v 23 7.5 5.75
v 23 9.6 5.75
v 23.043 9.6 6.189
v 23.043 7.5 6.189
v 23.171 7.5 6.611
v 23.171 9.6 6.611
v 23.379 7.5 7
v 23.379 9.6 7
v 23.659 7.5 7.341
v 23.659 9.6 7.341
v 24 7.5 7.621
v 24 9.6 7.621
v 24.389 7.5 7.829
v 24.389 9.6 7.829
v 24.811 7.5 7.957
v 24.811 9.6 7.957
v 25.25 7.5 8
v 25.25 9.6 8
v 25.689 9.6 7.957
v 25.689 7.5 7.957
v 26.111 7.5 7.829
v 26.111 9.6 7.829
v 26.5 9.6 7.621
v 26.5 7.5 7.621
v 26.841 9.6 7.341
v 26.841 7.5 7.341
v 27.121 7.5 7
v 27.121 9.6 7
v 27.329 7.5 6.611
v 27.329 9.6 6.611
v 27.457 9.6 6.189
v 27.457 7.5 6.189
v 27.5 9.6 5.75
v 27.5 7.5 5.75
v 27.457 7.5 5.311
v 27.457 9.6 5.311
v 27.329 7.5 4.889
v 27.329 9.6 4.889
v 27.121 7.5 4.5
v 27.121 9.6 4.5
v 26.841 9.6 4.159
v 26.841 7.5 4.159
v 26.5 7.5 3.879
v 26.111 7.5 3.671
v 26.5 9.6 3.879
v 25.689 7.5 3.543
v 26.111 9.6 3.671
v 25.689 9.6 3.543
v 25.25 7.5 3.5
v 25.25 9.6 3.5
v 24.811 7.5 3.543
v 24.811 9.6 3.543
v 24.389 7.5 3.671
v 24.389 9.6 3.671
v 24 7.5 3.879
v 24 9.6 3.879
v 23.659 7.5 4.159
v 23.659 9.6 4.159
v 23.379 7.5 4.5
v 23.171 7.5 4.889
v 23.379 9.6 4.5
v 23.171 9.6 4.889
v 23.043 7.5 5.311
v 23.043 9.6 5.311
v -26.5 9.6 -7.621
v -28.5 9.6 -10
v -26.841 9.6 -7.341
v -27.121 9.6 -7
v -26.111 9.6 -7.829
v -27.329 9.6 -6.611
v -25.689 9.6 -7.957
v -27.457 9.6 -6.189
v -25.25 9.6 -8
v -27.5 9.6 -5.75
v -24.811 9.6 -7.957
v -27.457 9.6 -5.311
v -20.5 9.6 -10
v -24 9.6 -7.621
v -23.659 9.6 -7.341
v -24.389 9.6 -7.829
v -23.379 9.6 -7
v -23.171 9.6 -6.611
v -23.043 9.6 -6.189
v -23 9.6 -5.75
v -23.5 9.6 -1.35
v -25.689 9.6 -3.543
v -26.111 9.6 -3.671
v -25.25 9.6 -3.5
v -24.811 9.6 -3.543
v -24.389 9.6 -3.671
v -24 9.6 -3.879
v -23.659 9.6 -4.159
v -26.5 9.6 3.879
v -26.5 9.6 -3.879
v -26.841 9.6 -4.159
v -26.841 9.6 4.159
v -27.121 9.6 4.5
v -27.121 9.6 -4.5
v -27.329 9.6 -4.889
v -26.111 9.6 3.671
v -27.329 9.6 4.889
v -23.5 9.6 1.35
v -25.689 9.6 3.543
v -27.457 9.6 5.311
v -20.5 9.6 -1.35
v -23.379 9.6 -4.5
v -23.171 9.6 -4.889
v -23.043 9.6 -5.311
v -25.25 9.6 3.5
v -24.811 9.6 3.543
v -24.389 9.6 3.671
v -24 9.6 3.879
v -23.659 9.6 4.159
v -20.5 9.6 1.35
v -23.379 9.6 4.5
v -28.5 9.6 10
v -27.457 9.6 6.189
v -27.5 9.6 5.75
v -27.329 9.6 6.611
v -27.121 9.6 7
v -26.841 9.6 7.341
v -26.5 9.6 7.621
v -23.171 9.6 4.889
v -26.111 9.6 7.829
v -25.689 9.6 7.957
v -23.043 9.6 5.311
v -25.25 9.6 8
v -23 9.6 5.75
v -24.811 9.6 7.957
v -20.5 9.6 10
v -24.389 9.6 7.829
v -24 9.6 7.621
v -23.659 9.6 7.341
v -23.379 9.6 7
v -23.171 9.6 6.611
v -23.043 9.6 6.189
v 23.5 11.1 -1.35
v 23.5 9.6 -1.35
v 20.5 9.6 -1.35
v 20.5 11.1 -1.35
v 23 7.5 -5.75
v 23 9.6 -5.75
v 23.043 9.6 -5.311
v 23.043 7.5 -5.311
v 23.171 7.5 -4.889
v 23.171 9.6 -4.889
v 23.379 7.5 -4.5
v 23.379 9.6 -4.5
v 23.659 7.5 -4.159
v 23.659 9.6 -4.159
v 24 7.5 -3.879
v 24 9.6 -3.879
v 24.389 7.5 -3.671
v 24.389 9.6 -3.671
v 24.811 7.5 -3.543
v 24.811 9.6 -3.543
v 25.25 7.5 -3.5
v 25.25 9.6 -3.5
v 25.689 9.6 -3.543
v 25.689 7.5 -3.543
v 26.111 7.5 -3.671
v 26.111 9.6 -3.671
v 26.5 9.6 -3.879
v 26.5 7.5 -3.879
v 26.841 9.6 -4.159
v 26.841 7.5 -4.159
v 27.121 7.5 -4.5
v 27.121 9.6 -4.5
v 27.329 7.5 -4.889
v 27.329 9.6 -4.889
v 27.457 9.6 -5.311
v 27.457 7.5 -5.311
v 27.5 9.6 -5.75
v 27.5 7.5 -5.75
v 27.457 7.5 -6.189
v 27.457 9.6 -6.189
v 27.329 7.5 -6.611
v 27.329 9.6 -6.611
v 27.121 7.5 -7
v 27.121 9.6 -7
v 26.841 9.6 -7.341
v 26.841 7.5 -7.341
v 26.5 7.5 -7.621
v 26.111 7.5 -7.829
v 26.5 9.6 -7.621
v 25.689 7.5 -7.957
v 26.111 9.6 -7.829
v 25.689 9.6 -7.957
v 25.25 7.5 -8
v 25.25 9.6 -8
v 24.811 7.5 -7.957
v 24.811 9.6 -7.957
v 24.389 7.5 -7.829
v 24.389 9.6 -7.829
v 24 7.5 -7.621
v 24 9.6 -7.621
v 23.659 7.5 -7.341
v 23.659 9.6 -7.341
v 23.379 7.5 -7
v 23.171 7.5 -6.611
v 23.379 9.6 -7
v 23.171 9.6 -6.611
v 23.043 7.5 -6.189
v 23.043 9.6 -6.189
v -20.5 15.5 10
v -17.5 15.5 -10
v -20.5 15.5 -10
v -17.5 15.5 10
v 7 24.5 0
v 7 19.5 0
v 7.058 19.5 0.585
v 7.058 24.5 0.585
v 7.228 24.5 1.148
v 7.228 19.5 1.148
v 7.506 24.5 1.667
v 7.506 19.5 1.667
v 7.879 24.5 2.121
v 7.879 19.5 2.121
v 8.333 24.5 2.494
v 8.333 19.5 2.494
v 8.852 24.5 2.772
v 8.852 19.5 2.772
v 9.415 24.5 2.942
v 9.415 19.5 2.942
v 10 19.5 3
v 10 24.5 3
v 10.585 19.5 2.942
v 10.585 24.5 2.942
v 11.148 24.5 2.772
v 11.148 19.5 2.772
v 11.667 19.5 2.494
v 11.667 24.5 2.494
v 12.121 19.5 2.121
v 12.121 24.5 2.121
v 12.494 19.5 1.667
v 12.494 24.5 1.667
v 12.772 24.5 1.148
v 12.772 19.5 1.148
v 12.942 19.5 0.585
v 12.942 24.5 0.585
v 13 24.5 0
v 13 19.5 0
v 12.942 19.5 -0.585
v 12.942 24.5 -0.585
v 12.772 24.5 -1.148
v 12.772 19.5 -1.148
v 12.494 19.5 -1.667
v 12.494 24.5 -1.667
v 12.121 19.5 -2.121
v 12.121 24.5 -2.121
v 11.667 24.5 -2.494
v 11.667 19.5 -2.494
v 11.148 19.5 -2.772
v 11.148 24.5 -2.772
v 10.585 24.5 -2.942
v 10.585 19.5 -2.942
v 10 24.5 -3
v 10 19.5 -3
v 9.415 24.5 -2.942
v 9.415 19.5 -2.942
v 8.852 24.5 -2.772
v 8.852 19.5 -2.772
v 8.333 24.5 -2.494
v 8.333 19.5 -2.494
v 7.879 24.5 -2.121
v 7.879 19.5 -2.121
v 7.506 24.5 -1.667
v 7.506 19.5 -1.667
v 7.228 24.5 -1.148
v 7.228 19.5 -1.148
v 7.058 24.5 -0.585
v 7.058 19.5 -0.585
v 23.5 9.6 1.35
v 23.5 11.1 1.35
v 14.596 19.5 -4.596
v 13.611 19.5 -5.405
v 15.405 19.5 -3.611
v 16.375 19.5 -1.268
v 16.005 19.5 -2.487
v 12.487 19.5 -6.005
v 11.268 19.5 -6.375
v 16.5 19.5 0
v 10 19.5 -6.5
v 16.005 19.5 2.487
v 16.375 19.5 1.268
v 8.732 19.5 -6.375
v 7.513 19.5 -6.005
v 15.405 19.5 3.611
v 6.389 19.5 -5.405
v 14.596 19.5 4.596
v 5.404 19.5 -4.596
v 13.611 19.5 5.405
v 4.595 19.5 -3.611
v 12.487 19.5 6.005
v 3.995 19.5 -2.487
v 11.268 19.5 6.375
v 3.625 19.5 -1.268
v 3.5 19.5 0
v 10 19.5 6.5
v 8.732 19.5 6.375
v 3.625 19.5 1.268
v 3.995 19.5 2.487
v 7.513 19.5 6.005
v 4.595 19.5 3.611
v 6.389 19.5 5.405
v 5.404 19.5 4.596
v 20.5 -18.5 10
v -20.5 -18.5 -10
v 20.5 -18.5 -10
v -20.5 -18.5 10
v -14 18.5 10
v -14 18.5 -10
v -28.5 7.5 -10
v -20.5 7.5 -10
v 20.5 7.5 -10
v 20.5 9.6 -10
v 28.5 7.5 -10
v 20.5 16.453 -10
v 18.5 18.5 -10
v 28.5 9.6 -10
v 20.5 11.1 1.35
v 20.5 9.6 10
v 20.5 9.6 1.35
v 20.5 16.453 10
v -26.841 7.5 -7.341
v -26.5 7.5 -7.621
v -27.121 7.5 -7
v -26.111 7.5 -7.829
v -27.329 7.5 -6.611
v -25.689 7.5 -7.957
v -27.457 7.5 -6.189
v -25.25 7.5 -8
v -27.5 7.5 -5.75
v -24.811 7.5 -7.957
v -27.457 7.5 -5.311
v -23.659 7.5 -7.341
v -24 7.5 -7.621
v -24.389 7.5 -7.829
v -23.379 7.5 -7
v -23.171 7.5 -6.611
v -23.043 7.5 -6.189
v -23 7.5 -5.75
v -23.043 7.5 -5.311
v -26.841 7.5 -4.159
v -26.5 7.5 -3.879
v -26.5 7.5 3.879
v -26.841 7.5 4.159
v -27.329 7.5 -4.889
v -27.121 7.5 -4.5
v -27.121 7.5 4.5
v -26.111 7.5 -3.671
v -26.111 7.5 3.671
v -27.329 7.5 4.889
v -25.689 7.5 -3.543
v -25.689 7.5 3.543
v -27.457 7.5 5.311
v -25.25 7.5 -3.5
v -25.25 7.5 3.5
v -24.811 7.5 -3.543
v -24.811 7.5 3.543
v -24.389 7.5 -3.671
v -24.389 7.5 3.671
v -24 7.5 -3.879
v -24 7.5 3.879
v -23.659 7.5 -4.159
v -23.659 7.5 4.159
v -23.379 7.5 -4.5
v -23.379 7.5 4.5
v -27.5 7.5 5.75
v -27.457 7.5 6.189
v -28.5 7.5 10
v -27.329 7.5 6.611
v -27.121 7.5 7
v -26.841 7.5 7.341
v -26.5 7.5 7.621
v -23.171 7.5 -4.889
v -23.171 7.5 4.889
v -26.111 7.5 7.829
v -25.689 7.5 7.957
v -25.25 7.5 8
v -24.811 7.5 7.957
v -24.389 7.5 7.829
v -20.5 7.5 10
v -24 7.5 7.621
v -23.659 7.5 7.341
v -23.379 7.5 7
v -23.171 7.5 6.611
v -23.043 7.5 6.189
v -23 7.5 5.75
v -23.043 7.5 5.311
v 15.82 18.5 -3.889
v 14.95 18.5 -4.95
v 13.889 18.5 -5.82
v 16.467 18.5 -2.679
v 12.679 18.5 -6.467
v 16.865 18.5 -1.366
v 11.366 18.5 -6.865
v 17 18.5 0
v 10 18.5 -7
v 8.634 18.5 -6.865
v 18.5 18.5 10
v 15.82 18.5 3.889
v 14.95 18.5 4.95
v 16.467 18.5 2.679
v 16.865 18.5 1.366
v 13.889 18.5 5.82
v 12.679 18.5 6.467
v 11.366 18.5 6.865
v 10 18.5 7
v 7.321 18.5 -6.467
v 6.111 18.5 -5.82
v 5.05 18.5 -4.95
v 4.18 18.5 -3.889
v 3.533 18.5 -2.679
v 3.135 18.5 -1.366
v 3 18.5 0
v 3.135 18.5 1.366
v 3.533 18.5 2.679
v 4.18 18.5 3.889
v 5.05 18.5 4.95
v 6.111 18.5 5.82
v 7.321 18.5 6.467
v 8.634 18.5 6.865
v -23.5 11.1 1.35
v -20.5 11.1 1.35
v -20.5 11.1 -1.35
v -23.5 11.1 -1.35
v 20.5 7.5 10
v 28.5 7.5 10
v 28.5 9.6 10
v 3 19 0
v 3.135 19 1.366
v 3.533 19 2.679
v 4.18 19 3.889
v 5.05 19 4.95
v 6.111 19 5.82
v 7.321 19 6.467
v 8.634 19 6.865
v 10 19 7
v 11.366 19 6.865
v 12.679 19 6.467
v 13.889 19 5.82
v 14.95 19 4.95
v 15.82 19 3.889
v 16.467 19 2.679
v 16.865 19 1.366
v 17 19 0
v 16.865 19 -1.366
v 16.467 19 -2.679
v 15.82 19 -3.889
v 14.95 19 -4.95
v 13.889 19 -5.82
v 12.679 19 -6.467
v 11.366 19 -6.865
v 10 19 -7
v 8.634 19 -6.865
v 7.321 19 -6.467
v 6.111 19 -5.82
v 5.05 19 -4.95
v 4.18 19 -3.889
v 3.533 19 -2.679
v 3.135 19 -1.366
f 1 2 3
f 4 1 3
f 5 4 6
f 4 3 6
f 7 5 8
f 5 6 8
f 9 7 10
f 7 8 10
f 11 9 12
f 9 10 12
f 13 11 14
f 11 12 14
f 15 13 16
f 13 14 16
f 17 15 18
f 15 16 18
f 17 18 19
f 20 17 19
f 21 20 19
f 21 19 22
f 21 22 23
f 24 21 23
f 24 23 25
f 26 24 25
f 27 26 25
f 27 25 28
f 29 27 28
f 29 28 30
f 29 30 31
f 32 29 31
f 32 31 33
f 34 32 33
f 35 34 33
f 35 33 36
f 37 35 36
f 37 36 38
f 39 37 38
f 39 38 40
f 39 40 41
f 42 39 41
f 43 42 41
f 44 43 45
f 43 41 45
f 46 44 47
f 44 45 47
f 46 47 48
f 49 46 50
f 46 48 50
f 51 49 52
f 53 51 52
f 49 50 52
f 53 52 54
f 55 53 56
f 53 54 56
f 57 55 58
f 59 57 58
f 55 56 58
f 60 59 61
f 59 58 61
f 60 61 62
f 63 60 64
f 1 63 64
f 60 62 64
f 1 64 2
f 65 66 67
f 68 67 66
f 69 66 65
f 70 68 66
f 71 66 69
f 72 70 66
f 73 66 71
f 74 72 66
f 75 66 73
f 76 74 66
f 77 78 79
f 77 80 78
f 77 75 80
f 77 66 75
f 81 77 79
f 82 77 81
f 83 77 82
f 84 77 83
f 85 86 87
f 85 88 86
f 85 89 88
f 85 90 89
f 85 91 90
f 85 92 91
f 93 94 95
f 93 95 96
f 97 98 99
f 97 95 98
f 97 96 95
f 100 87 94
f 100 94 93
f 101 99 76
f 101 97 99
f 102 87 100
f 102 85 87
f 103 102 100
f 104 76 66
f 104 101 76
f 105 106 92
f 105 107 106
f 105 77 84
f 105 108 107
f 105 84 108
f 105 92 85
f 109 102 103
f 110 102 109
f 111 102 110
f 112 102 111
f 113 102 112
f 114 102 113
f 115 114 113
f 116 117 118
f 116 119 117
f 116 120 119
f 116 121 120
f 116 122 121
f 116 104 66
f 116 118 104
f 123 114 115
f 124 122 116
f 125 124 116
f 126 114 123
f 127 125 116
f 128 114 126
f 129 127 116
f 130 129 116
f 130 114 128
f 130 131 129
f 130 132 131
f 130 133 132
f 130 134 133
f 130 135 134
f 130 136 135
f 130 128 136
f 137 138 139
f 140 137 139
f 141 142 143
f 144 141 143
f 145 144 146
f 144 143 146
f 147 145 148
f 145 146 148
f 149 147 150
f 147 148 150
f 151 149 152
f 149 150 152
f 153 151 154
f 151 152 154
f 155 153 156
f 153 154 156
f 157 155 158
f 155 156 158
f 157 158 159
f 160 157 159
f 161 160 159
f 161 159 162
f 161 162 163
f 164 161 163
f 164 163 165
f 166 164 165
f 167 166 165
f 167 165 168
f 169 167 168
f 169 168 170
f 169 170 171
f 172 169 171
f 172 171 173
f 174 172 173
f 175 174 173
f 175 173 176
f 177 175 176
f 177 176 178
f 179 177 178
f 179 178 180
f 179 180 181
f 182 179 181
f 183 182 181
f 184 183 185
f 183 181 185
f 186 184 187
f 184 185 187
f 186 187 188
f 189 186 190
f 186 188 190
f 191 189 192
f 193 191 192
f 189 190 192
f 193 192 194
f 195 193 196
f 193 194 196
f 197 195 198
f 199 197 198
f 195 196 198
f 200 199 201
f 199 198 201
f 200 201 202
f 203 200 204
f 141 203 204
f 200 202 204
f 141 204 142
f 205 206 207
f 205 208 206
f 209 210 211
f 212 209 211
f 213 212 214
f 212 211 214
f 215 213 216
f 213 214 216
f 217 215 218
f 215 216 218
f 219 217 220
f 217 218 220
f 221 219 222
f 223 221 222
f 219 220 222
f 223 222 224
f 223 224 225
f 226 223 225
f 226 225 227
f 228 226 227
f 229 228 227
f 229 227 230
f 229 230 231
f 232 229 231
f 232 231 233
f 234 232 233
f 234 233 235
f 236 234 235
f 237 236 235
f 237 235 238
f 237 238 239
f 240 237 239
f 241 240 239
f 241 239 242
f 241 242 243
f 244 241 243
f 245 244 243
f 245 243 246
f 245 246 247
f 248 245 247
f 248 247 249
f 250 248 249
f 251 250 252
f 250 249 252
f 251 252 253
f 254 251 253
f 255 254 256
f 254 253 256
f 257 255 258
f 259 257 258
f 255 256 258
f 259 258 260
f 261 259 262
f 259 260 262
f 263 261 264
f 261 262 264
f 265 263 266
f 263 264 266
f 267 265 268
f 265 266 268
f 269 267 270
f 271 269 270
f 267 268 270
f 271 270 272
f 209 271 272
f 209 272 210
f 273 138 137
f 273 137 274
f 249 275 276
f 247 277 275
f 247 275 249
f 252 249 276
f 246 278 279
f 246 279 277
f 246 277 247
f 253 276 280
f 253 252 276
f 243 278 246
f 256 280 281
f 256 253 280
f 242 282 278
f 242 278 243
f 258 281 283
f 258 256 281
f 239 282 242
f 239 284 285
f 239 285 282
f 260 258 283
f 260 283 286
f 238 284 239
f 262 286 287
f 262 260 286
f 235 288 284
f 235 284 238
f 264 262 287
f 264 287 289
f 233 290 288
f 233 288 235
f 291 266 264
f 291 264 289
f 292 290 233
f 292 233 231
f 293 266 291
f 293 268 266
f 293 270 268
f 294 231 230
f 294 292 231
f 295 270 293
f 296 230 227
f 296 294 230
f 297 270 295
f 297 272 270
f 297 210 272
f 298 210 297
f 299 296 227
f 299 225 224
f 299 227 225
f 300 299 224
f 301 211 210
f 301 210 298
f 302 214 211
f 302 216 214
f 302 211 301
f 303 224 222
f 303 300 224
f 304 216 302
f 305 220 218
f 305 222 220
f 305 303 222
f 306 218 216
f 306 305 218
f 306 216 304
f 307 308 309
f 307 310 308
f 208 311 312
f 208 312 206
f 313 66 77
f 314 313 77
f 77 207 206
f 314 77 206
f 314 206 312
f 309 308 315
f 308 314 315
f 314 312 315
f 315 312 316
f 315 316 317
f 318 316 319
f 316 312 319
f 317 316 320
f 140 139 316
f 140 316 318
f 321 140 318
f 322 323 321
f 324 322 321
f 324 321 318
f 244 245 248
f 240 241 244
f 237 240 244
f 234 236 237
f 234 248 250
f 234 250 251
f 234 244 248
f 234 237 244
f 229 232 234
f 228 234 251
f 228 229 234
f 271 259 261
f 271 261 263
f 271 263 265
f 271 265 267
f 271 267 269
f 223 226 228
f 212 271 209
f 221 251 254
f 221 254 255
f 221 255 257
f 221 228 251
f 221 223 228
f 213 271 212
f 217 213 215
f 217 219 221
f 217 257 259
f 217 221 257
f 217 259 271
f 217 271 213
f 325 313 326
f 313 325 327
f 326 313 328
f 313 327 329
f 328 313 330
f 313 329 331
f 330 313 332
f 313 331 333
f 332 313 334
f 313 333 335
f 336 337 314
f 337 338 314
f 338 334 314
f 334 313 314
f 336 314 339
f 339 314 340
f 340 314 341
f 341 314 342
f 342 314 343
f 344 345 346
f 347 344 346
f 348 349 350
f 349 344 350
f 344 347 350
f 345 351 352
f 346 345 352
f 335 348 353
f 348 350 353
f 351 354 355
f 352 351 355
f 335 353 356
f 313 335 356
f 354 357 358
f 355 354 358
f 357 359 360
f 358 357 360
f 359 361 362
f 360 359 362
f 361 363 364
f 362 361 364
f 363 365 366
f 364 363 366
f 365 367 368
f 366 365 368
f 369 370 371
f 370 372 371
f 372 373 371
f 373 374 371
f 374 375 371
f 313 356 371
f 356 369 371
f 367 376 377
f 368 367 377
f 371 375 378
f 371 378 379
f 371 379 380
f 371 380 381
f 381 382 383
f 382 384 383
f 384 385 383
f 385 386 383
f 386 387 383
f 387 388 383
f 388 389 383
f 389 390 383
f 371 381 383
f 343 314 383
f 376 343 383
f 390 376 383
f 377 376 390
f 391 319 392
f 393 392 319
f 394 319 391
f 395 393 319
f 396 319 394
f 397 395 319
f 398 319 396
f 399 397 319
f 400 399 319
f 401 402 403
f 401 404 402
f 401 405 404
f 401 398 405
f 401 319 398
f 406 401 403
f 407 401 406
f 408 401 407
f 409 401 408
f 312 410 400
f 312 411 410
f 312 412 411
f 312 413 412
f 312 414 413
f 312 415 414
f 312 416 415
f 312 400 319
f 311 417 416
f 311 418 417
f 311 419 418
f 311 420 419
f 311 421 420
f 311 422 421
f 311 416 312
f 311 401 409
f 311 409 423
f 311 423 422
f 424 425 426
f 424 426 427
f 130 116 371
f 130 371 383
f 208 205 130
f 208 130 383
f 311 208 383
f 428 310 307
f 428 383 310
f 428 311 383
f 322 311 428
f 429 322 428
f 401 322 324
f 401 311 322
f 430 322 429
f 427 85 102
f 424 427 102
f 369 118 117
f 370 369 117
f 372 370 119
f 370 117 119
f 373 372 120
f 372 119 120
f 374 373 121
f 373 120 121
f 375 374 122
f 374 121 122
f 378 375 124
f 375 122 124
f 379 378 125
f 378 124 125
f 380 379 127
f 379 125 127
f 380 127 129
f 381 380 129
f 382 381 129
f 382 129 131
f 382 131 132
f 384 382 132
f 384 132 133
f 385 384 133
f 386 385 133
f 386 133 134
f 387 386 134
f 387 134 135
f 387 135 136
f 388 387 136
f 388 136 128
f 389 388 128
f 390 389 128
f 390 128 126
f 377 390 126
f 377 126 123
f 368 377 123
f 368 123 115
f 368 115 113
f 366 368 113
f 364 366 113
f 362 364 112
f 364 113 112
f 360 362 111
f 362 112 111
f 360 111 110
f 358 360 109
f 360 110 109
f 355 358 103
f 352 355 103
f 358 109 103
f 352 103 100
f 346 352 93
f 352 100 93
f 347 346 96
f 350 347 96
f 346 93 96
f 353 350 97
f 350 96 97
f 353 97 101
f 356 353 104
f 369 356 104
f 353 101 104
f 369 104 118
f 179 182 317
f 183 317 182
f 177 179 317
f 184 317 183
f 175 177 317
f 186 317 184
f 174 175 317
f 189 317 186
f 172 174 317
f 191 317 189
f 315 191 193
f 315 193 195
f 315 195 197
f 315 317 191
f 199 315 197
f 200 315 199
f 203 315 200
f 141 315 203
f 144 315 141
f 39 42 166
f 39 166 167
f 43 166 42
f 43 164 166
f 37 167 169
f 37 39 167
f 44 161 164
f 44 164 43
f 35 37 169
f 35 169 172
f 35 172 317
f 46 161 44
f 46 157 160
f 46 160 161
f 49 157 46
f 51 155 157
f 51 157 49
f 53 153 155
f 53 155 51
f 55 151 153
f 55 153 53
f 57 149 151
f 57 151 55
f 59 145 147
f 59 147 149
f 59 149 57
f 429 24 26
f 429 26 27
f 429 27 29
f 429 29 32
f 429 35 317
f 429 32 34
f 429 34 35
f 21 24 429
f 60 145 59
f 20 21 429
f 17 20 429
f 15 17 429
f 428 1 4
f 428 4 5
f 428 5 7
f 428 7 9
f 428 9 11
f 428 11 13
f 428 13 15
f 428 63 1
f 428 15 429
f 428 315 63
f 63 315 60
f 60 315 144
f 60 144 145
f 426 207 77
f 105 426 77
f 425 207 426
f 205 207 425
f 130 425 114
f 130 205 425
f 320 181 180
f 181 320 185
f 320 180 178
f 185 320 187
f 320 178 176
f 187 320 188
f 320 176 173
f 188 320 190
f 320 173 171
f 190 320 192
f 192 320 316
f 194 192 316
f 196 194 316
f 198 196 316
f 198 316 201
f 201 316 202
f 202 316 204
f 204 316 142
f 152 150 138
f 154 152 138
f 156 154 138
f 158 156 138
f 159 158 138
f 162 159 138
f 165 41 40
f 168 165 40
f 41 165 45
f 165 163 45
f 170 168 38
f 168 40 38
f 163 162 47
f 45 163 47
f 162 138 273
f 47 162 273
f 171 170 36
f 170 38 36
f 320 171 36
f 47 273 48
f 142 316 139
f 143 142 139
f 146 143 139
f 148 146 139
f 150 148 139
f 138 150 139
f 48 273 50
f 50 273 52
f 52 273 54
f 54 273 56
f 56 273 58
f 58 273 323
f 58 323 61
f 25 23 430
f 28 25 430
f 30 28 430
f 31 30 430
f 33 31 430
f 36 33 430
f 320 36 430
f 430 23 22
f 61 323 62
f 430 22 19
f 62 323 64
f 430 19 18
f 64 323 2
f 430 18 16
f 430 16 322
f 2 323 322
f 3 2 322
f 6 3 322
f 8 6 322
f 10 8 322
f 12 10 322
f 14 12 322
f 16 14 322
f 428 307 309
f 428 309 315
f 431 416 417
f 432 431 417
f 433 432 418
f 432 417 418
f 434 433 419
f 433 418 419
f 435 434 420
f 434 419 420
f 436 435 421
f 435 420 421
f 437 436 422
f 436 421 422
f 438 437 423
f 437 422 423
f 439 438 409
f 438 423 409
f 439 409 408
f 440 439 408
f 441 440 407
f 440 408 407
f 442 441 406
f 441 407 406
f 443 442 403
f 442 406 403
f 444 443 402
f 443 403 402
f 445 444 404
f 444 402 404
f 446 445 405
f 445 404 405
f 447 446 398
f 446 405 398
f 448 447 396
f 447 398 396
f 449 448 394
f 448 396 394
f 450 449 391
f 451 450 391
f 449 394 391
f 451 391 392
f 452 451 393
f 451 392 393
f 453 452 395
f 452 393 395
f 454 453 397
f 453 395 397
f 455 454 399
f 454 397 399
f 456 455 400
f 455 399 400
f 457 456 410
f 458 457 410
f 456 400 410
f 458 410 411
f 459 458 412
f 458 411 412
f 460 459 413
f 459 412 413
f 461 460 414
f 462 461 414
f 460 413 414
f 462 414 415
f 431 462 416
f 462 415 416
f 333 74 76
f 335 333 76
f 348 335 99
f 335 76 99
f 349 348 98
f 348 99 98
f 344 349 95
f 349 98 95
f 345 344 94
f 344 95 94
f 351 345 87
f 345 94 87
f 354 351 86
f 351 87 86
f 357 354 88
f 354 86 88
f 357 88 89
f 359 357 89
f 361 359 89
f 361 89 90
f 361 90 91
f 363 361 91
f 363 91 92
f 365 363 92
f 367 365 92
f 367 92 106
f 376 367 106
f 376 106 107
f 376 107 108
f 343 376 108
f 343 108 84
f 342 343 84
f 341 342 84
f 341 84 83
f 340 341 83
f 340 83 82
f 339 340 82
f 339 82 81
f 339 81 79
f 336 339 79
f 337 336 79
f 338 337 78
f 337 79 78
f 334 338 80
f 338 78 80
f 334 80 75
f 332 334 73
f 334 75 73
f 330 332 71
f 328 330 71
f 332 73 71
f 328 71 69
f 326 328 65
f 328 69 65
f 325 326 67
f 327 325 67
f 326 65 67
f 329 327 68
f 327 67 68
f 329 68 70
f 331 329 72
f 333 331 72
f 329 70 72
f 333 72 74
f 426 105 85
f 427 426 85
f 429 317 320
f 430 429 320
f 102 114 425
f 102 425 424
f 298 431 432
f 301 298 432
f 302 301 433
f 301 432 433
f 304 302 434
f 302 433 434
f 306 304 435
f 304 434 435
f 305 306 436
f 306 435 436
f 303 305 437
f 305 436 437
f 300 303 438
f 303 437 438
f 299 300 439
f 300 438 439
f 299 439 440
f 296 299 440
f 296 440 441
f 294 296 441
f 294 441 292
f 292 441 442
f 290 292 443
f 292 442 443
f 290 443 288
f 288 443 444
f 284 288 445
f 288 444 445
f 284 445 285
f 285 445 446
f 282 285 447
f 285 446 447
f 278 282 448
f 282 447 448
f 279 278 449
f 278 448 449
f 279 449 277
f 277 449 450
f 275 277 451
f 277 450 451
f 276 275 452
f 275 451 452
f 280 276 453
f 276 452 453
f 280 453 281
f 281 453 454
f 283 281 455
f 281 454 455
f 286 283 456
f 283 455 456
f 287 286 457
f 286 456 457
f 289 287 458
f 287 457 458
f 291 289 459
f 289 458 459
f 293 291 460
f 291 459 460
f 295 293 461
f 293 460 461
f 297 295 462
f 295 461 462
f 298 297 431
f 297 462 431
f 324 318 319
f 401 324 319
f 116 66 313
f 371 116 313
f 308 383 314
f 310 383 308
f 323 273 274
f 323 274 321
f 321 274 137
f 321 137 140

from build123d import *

# Parameters (mm, degrees)
F1_DEPTH  = 10
F2_R      = 7
F2_R_2    = 3
F3_DEPTH  = 1
F4_DEPTH  = 6
F5_SIZE   = 0.5
F6_W      = 2.1
F6_H      = 20
F8_DEPTH  = 8
F7_W      = 2.1
F7_H      = 20
F9_DEPTH  = 8
F10_R     = 2.25
F11_DEPTH = 28.101
F10_W     = 3
F10_H     = 2.7
F12_DEPTH = 1.5


with BuildPart() as f1:
    # F0 (on Top) → F1 (new body, symmetric)
    with BuildSketch(Plane.XY):
        Polygon((-20.5, -18.5), (20.5, -18.5), (20.5, 16.4531469345), (18.5, 18.5), (-14, 18.5), (-17.5, 15.5), (-20.5, 15.5), align=None)
    extrude(amount=F1_DEPTH, both=True)

    # F2 (on face) → F3 (join)
    with BuildSketch(Plane(origin=(0, 18.5, 0), x_dir=(-1, 0, 0), z_dir=(0, 1, 0))):
        with Locations((-10, 0)):
            Circle(F2_R)
        with Locations((-10, 0)):
            Circle(F2_R_2, mode=Mode.SUBTRACT)
    extrude(amount=F3_DEPTH)

    # F4 (add): a face of the model
    f4_faces = [f1.faces().sort_by_distance(p)[0] for p in [
        (10, 18.5, 0),
    ]]
    extrude(f4_faces, amount=F4_DEPTH)

    # F5
    f5_edges = [f1.edges().sort_by_distance(p)[0] for p in [
        (17, 19.5, 0),
    ]]
    chamfer(f5_edges, length=F5_SIZE)

    # F6 (on face) → F8 (join)
    with BuildSketch(Plane(origin=(-20.5, 0, 0), x_dir=(0, -1, 0), z_dir=(-1, 0, 0))):
        with Locations((-8.55, 0)):
            Rectangle(F6_W, F6_H)
    extrude(amount=F8_DEPTH)

    # F7 (on face) → F9 (join)
    with BuildSketch(Plane.YZ.offset(20.5)):
        with Locations((8.55, 0)):
            Rectangle(F7_W, F7_H)
    extrude(amount=F9_DEPTH)

    # F10 (on face) → F11 (cut, through all)
    with BuildSketch(Plane(origin=(0, 9.6, 0), x_dir=(-1, 0, 0), z_dir=(0, 1, 0))):
        with Locations((-25.25, 5.75)):
            Circle(F10_R)
        with Locations((-25.25, -5.75)):
            Circle(F10_R)
        with Locations((25.25, -5.75)):
            Circle(F10_R)
        with Locations((25.25, 5.75)):
            Circle(F10_R)
    extrude(amount=-F11_DEPTH, mode=Mode.SUBTRACT)

    # F10 (on face) → F12 (join)
    with BuildSketch(Plane(origin=(0, 9.6, 0), x_dir=(-1, 0, 0), z_dir=(0, 1, 0))):
        with Locations((-22, 0)):
            Rectangle(F10_W, F10_H)
        with Locations((22, 0)):
            Rectangle(F10_W, F10_H)
    extrude(amount=F12_DEPTH)


solid = f1.part
